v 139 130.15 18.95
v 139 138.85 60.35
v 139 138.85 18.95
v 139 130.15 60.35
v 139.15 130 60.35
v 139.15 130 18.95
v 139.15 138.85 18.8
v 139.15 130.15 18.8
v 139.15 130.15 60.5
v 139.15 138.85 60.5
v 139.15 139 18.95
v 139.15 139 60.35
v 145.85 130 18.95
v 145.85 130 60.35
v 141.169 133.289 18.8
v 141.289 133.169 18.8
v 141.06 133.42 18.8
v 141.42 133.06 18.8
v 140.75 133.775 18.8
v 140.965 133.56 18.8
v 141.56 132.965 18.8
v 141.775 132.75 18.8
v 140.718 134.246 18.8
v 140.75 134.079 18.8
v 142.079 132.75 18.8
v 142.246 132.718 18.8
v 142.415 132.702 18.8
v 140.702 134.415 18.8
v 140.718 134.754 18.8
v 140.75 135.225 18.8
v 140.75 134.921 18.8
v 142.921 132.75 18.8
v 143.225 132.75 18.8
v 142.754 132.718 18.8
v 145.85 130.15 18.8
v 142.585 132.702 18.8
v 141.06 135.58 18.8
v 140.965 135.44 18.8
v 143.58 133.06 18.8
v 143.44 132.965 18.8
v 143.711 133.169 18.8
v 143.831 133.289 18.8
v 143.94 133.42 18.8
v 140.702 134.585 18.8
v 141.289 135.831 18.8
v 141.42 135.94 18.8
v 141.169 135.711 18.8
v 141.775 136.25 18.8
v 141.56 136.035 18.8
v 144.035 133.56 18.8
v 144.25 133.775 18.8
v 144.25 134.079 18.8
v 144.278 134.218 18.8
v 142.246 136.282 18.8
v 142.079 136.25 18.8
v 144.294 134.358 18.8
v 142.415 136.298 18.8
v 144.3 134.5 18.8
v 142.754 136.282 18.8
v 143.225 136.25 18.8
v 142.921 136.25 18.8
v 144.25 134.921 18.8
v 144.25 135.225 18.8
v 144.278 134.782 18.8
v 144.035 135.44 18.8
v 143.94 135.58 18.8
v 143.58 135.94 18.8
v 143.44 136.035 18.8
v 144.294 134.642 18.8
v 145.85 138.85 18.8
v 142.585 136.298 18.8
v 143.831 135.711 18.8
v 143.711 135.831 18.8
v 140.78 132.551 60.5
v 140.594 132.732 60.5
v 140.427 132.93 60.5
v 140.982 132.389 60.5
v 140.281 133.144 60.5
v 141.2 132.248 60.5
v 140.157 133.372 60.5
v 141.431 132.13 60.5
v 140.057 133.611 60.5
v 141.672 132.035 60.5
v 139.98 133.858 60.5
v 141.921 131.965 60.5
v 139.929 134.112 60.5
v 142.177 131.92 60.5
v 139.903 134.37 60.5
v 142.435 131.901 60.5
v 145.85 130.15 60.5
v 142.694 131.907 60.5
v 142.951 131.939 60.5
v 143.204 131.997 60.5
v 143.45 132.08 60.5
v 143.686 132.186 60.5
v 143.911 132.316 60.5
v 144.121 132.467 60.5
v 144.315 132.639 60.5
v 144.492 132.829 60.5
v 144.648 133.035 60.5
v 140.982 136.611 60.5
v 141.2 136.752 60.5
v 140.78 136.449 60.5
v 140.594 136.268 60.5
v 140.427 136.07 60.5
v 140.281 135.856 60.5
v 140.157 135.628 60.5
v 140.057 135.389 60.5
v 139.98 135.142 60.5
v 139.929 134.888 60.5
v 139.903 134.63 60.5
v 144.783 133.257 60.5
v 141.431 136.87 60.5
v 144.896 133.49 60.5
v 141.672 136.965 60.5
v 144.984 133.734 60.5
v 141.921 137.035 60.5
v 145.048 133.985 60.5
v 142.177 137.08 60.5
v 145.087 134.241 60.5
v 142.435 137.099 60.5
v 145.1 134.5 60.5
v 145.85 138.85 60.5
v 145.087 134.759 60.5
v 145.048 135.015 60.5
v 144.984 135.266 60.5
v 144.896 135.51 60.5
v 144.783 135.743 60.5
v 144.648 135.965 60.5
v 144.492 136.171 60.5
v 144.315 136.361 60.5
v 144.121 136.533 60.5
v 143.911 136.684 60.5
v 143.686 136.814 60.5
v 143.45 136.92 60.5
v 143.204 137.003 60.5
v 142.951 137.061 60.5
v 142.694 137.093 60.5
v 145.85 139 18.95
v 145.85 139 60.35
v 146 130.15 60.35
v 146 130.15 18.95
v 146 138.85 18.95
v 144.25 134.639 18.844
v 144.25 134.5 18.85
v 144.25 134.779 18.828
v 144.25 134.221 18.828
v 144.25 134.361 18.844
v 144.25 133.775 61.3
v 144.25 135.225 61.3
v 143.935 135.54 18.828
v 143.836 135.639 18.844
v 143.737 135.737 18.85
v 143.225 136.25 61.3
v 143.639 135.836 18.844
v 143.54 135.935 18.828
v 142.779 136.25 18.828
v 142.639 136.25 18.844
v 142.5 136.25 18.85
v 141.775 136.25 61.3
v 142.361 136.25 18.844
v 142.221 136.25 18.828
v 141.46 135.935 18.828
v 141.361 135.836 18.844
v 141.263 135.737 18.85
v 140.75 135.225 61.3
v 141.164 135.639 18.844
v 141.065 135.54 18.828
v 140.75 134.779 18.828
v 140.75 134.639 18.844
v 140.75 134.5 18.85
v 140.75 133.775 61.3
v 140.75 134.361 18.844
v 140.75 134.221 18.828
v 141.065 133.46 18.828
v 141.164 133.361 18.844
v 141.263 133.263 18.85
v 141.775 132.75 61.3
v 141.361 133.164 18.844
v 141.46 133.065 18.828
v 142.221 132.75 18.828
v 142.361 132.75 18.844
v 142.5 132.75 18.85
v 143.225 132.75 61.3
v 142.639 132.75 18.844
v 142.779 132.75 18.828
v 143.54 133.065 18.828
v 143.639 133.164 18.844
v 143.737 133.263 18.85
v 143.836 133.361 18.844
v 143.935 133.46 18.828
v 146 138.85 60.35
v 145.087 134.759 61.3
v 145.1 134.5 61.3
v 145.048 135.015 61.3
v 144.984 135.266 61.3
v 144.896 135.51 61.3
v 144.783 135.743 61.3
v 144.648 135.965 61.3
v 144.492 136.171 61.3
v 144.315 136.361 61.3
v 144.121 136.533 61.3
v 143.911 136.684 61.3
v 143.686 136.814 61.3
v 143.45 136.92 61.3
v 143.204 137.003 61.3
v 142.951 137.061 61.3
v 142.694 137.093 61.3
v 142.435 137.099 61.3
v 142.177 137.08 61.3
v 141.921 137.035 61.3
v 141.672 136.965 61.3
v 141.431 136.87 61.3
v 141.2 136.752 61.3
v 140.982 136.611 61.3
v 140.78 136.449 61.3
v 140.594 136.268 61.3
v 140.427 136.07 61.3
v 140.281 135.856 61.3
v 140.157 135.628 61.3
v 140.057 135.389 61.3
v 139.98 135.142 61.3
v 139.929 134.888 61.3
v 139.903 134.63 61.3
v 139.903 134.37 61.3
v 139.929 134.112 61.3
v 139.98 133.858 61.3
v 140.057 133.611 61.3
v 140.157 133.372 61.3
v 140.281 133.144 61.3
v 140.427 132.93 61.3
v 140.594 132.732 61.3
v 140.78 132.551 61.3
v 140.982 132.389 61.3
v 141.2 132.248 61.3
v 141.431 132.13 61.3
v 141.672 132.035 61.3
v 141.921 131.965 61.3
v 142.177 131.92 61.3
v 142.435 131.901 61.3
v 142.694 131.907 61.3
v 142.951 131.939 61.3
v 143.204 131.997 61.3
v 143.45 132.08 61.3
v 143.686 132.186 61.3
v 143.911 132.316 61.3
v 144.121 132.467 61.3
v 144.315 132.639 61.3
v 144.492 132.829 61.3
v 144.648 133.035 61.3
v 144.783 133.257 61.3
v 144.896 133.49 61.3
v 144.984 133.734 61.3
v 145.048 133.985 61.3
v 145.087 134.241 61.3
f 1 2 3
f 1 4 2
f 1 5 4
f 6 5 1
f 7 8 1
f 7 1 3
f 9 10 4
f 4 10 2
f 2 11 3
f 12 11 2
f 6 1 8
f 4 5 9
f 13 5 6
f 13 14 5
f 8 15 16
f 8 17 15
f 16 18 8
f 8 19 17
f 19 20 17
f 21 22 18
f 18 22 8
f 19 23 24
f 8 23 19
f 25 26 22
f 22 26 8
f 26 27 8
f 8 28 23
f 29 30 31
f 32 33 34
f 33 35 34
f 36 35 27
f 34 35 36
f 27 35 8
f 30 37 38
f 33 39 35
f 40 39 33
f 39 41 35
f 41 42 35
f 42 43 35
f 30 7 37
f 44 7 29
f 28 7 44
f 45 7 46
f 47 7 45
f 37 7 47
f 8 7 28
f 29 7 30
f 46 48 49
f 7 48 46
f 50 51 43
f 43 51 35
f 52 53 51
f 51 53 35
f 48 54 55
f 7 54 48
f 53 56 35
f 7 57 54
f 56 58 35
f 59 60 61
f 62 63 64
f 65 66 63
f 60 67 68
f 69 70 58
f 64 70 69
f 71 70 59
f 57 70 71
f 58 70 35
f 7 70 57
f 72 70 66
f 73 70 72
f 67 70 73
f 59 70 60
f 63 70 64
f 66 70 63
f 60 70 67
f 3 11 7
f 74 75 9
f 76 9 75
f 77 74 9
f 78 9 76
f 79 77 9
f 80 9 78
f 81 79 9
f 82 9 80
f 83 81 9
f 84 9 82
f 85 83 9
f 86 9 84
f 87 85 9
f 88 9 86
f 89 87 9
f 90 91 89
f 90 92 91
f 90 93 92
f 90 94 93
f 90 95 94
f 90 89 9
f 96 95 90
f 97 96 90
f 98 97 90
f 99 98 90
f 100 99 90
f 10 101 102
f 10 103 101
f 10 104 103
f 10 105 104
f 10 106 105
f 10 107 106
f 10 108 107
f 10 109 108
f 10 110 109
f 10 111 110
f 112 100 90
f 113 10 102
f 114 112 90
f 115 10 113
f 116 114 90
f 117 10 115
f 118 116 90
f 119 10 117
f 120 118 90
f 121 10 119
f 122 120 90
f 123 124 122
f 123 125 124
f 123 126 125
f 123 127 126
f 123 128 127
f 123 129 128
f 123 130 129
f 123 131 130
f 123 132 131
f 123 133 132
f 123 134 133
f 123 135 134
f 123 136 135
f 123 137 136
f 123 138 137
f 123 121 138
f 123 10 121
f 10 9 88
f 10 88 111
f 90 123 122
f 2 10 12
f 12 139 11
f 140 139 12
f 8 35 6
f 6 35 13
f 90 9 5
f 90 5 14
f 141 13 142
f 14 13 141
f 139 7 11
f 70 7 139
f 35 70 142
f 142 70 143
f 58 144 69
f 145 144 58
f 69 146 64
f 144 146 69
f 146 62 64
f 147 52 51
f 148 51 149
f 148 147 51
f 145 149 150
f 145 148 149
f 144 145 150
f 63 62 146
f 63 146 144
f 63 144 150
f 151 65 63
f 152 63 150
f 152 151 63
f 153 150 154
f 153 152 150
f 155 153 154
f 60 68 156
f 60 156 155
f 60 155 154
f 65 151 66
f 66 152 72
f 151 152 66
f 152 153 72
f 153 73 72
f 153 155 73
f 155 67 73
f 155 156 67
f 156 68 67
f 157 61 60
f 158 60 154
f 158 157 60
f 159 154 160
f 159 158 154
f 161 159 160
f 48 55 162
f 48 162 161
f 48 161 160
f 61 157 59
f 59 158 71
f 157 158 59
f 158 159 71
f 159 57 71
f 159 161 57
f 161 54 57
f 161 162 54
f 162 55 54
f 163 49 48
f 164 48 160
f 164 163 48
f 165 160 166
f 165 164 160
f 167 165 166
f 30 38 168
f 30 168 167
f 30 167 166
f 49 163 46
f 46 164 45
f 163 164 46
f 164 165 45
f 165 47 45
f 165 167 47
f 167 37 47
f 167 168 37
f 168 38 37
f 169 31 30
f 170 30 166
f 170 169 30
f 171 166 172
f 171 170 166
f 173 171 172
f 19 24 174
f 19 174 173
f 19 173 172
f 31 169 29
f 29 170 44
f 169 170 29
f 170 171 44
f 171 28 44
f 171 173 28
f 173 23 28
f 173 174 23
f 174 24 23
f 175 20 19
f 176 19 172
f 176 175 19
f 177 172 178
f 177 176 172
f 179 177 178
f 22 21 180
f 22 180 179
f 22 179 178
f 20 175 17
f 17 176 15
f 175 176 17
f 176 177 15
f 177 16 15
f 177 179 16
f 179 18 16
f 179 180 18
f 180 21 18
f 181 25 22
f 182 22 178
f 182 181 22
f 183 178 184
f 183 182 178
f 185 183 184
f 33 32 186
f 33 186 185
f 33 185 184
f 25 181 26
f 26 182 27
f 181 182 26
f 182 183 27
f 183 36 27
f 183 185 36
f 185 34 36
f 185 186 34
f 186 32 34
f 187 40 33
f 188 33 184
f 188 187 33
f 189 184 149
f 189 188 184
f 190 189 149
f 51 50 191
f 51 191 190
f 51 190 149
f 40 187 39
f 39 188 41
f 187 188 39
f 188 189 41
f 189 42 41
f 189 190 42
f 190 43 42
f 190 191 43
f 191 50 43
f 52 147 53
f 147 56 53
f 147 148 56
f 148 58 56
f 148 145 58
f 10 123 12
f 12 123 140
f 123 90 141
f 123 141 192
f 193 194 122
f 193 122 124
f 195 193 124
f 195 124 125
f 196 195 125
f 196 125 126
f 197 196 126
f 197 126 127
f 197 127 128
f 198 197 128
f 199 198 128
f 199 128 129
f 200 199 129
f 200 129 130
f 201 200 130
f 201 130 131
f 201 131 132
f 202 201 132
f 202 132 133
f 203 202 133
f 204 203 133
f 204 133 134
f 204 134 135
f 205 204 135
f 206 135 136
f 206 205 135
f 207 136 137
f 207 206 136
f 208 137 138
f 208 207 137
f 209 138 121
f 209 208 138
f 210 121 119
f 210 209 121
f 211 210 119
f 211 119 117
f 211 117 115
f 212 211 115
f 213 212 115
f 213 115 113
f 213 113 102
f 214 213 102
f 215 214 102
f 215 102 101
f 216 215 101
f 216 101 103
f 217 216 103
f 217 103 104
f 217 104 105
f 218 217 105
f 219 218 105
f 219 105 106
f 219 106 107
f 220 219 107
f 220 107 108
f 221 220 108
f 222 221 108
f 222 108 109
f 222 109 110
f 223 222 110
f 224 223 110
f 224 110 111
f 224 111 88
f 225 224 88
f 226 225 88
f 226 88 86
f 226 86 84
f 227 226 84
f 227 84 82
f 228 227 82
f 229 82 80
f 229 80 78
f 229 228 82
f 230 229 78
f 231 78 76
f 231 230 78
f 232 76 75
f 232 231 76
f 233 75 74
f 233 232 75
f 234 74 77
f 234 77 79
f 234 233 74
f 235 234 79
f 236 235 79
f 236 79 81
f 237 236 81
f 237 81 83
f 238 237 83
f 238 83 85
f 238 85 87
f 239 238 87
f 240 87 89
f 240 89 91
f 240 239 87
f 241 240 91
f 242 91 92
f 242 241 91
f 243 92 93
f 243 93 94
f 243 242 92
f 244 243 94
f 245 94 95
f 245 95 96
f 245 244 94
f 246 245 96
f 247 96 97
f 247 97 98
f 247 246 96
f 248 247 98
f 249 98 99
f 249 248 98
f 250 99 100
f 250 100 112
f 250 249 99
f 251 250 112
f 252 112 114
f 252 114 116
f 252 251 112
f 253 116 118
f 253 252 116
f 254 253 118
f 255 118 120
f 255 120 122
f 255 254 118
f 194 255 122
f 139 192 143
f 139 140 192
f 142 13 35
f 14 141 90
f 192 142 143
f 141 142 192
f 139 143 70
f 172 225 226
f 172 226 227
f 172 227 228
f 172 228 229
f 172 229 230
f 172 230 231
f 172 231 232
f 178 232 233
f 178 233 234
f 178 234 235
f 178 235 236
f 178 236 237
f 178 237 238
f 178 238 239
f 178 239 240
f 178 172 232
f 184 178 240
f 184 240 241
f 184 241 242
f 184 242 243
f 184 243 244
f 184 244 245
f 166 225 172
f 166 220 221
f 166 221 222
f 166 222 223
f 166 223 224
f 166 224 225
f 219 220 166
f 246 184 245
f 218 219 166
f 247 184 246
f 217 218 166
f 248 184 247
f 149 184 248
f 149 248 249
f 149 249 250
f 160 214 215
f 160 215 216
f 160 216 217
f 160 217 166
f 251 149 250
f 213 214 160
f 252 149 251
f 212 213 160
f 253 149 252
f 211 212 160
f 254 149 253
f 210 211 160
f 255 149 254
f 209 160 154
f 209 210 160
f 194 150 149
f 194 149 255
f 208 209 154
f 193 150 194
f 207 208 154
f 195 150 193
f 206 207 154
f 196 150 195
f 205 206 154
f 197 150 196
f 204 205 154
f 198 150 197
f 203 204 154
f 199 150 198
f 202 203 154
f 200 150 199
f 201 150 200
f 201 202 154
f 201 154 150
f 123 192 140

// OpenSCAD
// Generated by the canonical parent Python sources and validated exchange pipeline.
polyhedron(points=[[139.0, 130.14999389648438, 18.950000762939453], [139.0, 138.85000610351562, 60.349998474121094], [139.0, 138.85000610351562, 18.950000762939453], [139.0, 130.14999389648438, 60.349998474121094], [139.14999389648438, 130.0, 60.349998474121094], [139.14999389648438, 130.0, 18.950000762939453], [139.14999389648438, 138.85000610351562, 18.799999237060547], [139.14999389648438, 130.14999389648438, 18.799999237060547], [139.14999389648438, 130.14999389648438, 60.5], [139.14999389648438, 138.85000610351562, 60.5], [139.14999389648438, 139.0, 18.950000762939453], [139.14999389648438, 139.0, 60.349998474121094], [145.85000610351562, 130.0, 18.950000762939453], [145.85000610351562, 130.0, 60.349998474121094], [141.16851806640625, 133.2887420654297, 18.799999237060547], [141.2887420654297, 133.16851806640625, 18.799999237060547], [141.06016540527344, 133.41978454589844, 18.799999237060547], [141.41978454589844, 133.06016540527344, 18.799999237060547], [140.75, 133.77513122558594, 18.799999237060547], [140.96466064453125, 133.5604705810547, 18.799999237060547], [141.5604705810547, 132.96466064453125, 18.799999237060547], [141.77513122558594, 132.75, 18.799999237060547], [140.71804809570312, 134.24569702148438, 18.799999237060547], [140.75, 134.0786895751953, 18.799999237060547], [142.0786895751953, 132.75, 18.799999237060547], [142.24569702148438, 132.71804809570312, 18.799999237060547], [142.41497802734375, 132.70201110839844, 18.799999237060547], [140.70201110839844, 134.41497802734375, 18.799999237060547], [140.71804809570312, 134.75430297851562, 18.799999237060547], [140.75, 135.22486877441406, 18.799999237060547], [140.75, 134.9213104248047, 18.799999237060547], [142.9213104248047, 132.75, 18.799999237060547], [143.22486877441406, 132.75, 18.799999237060547], [142.75430297851562, 132.71804809570312, 18.799999237060547], [145.85000610351562, 130.14999389648438, 18.799999237060547], [142.58502197265625, 132.70201110839844, 18.799999237060547], [141.06016540527344, 135.58021545410156, 18.799999237060547], [140.96466064453125, 135.4395294189453, 18.799999237060547], [143.58021545410156, 133.06016540527344, 18.799999237060547], [143.4395294189453, 132.96466064453125, 18.799999237060547], [143.7112579345703, 133.16851806640625, 18.799999237060547], [143.83148193359375, 133.2887420654297, 18.799999237060547], [143.93983459472656, 133.41978454589844, 18.799999237060547], [140.70201110839844, 134.58502197265625, 18.799999237060547], [141.2887420654297, 135.83148193359375, 18.799999237060547], [141.41978454589844, 135.93983459472656, 18.799999237060547], [141.16851806640625, 135.7112579345703, 18.799999237060547], [141.77513122558594, 136.25, 18.799999237060547], [141.5604705810547, 136.03533935546875, 18.799999237060547], [144.03533935546875, 133.5604705810547, 18.799999237060547], [144.25, 133.77513122558594, 18.799999237060547], [144.25, 134.0786895751953, 18.799999237060547], [144.27772521972656, 134.21766662597656, 18.799999237060547], [142.24569702148438, 136.28195190429688, 18.799999237060547], [142.0786895751953, 136.25, 18.799999237060547], [144.29441833496094, 134.3583984375, 18.799999237060547], [142.41497802734375, 136.29798889160156, 18.799999237060547], [144.3000030517578, 134.5, 18.799999237060547], [142.75430297851562, 136.28195190429688, 18.799999237060547], [143.22486877441406, 136.25, 18.799999237060547], [142.9213104248047, 136.25, 18.799999237060547], [144.25, 134.9213104248047, 18.799999237060547], [144.25, 135.22486877441406, 18.799999237060547], [144.27772521972656, 134.78233337402344, 18.799999237060547], [144.03533935546875, 135.4395294189453, 18.799999237060547], [143.93983459472656, 135.58021545410156, 18.799999237060547], [143.58021545410156, 135.93983459472656, 18.799999237060547], [143.4395294189453, 136.03533935546875, 18.799999237060547], [144.29441833496094, 134.6416015625, 18.799999237060547], [145.85000610351562, 138.85000610351562, 18.799999237060547], [142.58502197265625, 136.29798889160156, 18.799999237060547], [143.83148193359375, 135.7112579345703, 18.799999237060547], [143.7112579345703, 135.83148193359375, 18.799999237060547], [140.7796173095703, 132.55056762695312, 60.5], [140.5940704345703, 132.73155212402344, 60.5], [140.42745971679688, 132.93011474609375, 60.5], [140.98226928710938, 132.3889617919922, 60.5], [140.2814483642578, 133.14427185058594, 60.5], [141.1999969482422, 132.2483367919922, 60.5], [140.15748596191406, 133.3719024658203, 60.5], [141.43064880371094, 132.1300811767578, 60.5], [140.05679321289062, 133.61074829101562, 60.5], [141.67193603515625, 132.03538513183594, 60.5], [139.9803924560547, 133.85842895507812, 60.5], [141.92144775390625, 131.96519470214844, 60.5], [139.92904663085938, 134.11248779296875, 60.5], [142.1767120361328, 131.92018127441406, 60.5], [139.90322875976562, 134.3704071044922, 60.5], [142.4351806640625, 131.9008026123047, 60.5], [145.85000610351562, 130.14999389648438, 60.5], [142.69430541992188, 131.9072723388672, 60.5], [142.9514923095703, 131.9394989013672, 60.5], [143.2041778564453, 131.99717712402344, 60.5], [143.44989013671875, 132.07972717285156, 60.5], [143.68614196777344, 132.18634033203125, 60.5], [143.91061401367188, 132.31593322753906, 60.5], [144.12107849121094, 132.4672393798828, 60.5], [144.31541442871094, 132.6387481689453, 60.5], [144.49171447753906, 132.82875061035156, 60.5], [144.64822387695312, 133.03536987304688, 60.5], [140.98226928710938, 136.6110382080078, 60.5], [141.1999969482422, 136.7516632080078, 60.5], [140.7796173095703, 136.44943237304688, 60.5], [140.5940704345703, 136.26844787597656, 60.5], [140.42745971679688, 136.06988525390625, 60.5], [140.2814483642578, 135.85572814941406, 60.5], [140.15748596191406, 135.6280975341797, 60.5], [140.05679321289062, 135.38925170898438, 60.5], [139.9803924560547, 135.14157104492188, 60.5], [139.92904663085938, 134.88751220703125, 60.5], [139.90322875976562, 134.6295928955078, 60.5], [144.7833709716797, 133.2565460205078, 60.5], [141.43064880371094, 136.8699188232422, 60.5], [144.89584350585938, 133.4900665283203, 60.5], [141.67193603515625, 136.96461486816406, 60.5], [144.98448181152344, 133.733642578125, 60.5], [141.92144775390625, 137.03480529785156, 60.5], [145.04844665527344, 133.9848175048828, 60.5], [142.1767120361328, 137.07981872558594, 60.5], [145.0870819091797, 134.24111938476562, 60.5], [142.4351806640625, 137.0991973876953, 60.5], [145.10000610351562, 134.5, 60.5], [145.85000610351562, 138.85000610351562, 60.5], [145.0870819091797, 134.75888061523438, 60.5], [145.04844665527344, 135.0151824951172, 60.5], [144.98448181152344, 135.266357421875, 60.5], [144.89584350585938, 135.5099334716797, 60.5], [144.7833709716797, 135.7434539794922, 60.5], [144.64822387695312, 135.96463012695312, 60.5], [144.49171447753906, 136.17124938964844, 60.5], [144.31541442871094, 136.3612518310547, 60.5], [144.12107849121094, 136.5327606201172, 60.5], [143.91061401367188, 136.68406677246094, 60.5], [143.68614196777344, 136.81365966796875, 60.5], [143.44989013671875, 136.92027282714844, 60.5], [143.2041778564453, 137.00282287597656, 60.5], [142.9514923095703, 137.0605010986328, 60.5], [142.69430541992188, 137.0927276611328, 60.5], [145.85000610351562, 139.0, 18.950000762939453], [145.85000610351562, 139.0, 60.349998474121094], [146.0, 130.14999389648438, 60.349998474121094], [146.0, 130.14999389648438, 18.950000762939453], [146.0, 138.85000610351562, 18.950000762939453], [144.25, 134.63926696777344, 18.844467163085938], [144.25, 134.5, 18.850000381469727], [144.25, 134.77940368652344, 18.827836990356445], [144.25, 134.22059631347656, 18.827836990356445], [144.25, 134.36073303222656, 18.844467163085938], [144.25, 133.77513122558594, 61.29999923706055], [144.25, 135.22486877441406, 61.29999923706055], [143.93499755859375, 135.5398712158203, 18.827836990356445], [143.83590698242188, 135.6389617919922, 18.844467163085938], [143.73744201660156, 135.73744201660156, 18.850000381469727], [143.22486877441406, 136.25, 61.29999923706055], [143.6389617919922, 135.83590698242188, 18.844467163085938], [143.5398712158203, 135.93499755859375, 18.827836990356445], [142.77940368652344, 136.25, 18.827836990356445], [142.63926696777344, 136.25, 18.844467163085938], [142.5, 136.25, 18.850000381469727], [141.77513122558594, 136.25, 61.29999923706055], [142.36073303222656, 136.25, 18.844467163085938], [142.22059631347656, 136.25, 18.827836990356445], [141.4601287841797, 135.93499755859375, 18.827836990356445], [141.3610382080078, 135.83590698242188, 18.844467163085938], [141.26255798339844, 135.73744201660156, 18.850000381469727], [140.75, 135.22486877441406, 61.29999923706055], [141.16409301757812, 135.6389617919922, 18.844467163085938], [141.06500244140625, 135.5398712158203, 18.827836990356445], [140.75, 134.77940368652344, 18.827836990356445], [140.75, 134.63926696777344, 18.844467163085938], [140.75, 134.5, 18.850000381469727], [140.75, 133.77513122558594, 61.29999923706055], [140.75, 134.36073303222656, 18.844467163085938], [140.75, 134.22059631347656, 18.827836990356445], [141.06500244140625, 133.4601287841797, 18.827836990356445], [141.16409301757812, 133.3610382080078, 18.844467163085938], [141.26255798339844, 133.26255798339844, 18.850000381469727], [141.77513122558594, 132.75, 61.29999923706055], [141.3610382080078, 133.16409301757812, 18.844467163085938], [141.4601287841797, 133.06500244140625, 18.827836990356445], [142.22059631347656, 132.75, 18.827836990356445], [142.36073303222656, 132.75, 18.844467163085938], [142.5, 132.75, 18.850000381469727], [143.22486877441406, 132.75, 61.29999923706055], [142.63926696777344, 132.75, 18.844467163085938], [142.77940368652344, 132.75, 18.827836990356445], [143.5398712158203, 133.06500244140625, 18.827836990356445], [143.6389617919922, 133.16409301757812, 18.844467163085938], [143.73744201660156, 133.26255798339844, 18.850000381469727], [143.83590698242188, 133.3610382080078, 18.844467163085938], [143.93499755859375, 133.4601287841797, 18.827836990356445], [146.0, 138.85000610351562, 60.349998474121094], [145.0870819091797, 134.75888061523438, 61.29999923706055], [145.10000610351562, 134.5, 61.29999923706055], [145.04844665527344, 135.0151824951172, 61.29999923706055], [144.98448181152344, 135.266357421875, 61.29999923706055], [144.89584350585938, 135.5099334716797, 61.29999923706055], [144.7833709716797, 135.7434539794922, 61.29999923706055], [144.64822387695312, 135.96463012695312, 61.29999923706055], [144.49171447753906, 136.17124938964844, 61.29999923706055], [144.31541442871094, 136.3612518310547, 61.29999923706055], [144.12107849121094, 136.5327606201172, 61.29999923706055], [143.91061401367188, 136.68406677246094, 61.29999923706055], [143.68614196777344, 136.81365966796875, 61.29999923706055], [143.44989013671875, 136.92027282714844, 61.29999923706055], [143.2041778564453, 137.00282287597656, 61.29999923706055], [142.9514923095703, 137.0605010986328, 61.29999923706055], [142.69430541992188, 137.0927276611328, 61.29999923706055], [142.4351806640625, 137.0991973876953, 61.29999923706055], [142.1767120361328, 137.07981872558594, 61.29999923706055], [141.92144775390625, 137.03480529785156, 61.29999923706055], [141.67193603515625, 136.96461486816406, 61.29999923706055], [141.43064880371094, 136.8699188232422, 61.29999923706055], [141.1999969482422, 136.7516632080078, 61.29999923706055], [140.98226928710938, 136.6110382080078, 61.29999923706055], [140.7796173095703, 136.44943237304688, 61.29999923706055], [140.5940704345703, 136.26844787597656, 61.29999923706055], [140.42745971679688, 136.06988525390625, 61.29999923706055], [140.2814483642578, 135.85572814941406, 61.29999923706055], [140.15748596191406, 135.6280975341797, 61.29999923706055], [140.05679321289062, 135.38925170898438, 61.29999923706055], [139.9803924560547, 135.14157104492188, 61.29999923706055], [139.92904663085938, 134.88751220703125, 61.29999923706055], [139.90322875976562, 134.6295928955078, 61.29999923706055], [139.90322875976562, 134.3704071044922, 61.29999923706055], [139.92904663085938, 134.11248779296875, 61.29999923706055], [139.9803924560547, 133.85842895507812, 61.29999923706055], [140.05679321289062, 133.61074829101562, 61.29999923706055], [140.15748596191406, 133.3719024658203, 61.29999923706055], [140.2814483642578, 133.14427185058594, 61.29999923706055], [140.42745971679688, 132.93011474609375, 61.29999923706055], [140.5940704345703, 132.73155212402344, 61.29999923706055], [140.7796173095703, 132.55056762695312, 61.29999923706055], [140.98226928710938, 132.3889617919922, 61.29999923706055], [141.1999969482422, 132.2483367919922, 61.29999923706055], [141.43064880371094, 132.1300811767578, 61.29999923706055], [141.67193603515625, 132.03538513183594, 61.29999923706055], [141.92144775390625, 131.96519470214844, 61.29999923706055], [142.1767120361328, 131.92018127441406, 61.29999923706055], [142.4351806640625, 131.9008026123047, 61.29999923706055], [142.69430541992188, 131.9072723388672, 61.29999923706055], [142.9514923095703, 131.9394989013672, 61.29999923706055], [143.2041778564453, 131.99717712402344, 61.29999923706055], [143.44989013671875, 132.07972717285156, 61.29999923706055], [143.68614196777344, 132.18634033203125, 61.29999923706055], [143.91061401367188, 132.31593322753906, 61.29999923706055], [144.12107849121094, 132.4672393798828, 61.29999923706055], [144.31541442871094, 132.6387481689453, 61.29999923706055], [144.49171447753906, 132.82875061035156, 61.29999923706055], [144.64822387695312, 133.03536987304688, 61.29999923706055], [144.7833709716797, 133.2565460205078, 61.29999923706055], [144.89584350585938, 133.4900665283203, 61.29999923706055], [144.98448181152344, 133.733642578125, 61.29999923706055], [145.04844665527344, 133.9848175048828, 61.29999923706055], [145.0870819091797, 134.24111938476562, 61.29999923706055]],faces=[[2, 1, 0], [1, 3, 0], [3, 4, 0], [0, 4, 5], [0, 7, 6], [2, 0, 6], [3, 9, 8], [1, 9, 3], [2, 10, 1], [1, 10, 11], [7, 0, 5], [8, 4, 3], [5, 4, 12], [4, 13, 12], [15, 14, 7], [14, 16, 7], [7, 17, 15], [16, 18, 7], [16, 19, 18], [17, 21, 20], [7, 21, 17], [23, 22, 18], [18, 22, 7], [21, 25, 24], [7, 25, 21], [7, 26, 25], [22, 27, 7], [30, 29, 28], [33, 32, 31], [33, 34, 32], [26, 34, 35], [35, 34, 33], [7, 34, 26], [37, 36, 29], [34, 38, 32], [32, 38, 39], [34, 40, 38], [34, 41, 40], [34, 42, 41], [36, 6, 29], [28, 6, 43], [43, 6, 27], [45, 6, 44], [44, 6, 46], [46, 6, 36], [27, 6, 7], [29, 6, 28], [48, 47, 45], [45, 47, 6], [42, 50, 49], [34, 50, 42], [50, 52, 51], [34, 52, 50], [54, 53, 47], [47, 53, 6], [34, 55, 52], [53, 56, 6], [34, 57, 55], [60, 59, 58], [63, 62, 61], [62, 65, 64], [67, 66, 59], [57, 69, 68], [68, 69, 63], [58, 69, 70], [70, 69, 56], [34, 69, 57], [56, 69, 6], [65, 69, 71], [71, 69, 72], [72, 69, 66], [59, 69, 58], [63, 69, 62], [62, 69, 65], [66, 69, 59], [6, 10, 2], [8, 74, 73], [74, 8, 75], [8, 73, 76], [75, 8, 77], [8, 76, 78], [77, 8, 79], [8, 78, 80], [79, 8, 81], [8, 80, 82], [81, 8, 83], [8, 82, 84], [83, 8, 85], [8, 84, 86], [85, 8, 87], [8, 86, 88], [88, 90, 89], [90, 91, 89], [91, 92, 89], [92, 93, 89], [93, 94, 89], [8, 88, 89], [89, 94, 95], [89, 95, 96], [89, 96, 97], [89, 97, 98], [89, 98, 99], [101, 100, 9], [100, 102, 9], [102, 103, 9], [103, 104, 9], [104, 105, 9], [105, 106, 9], [106, 107, 9], [107, 108, 9], [108, 109, 9], [109, 110, 9], [89, 99, 111], [101, 9, 112], [89, 111, 113], [112, 9, 114], [89, 113, 115], [114, 9, 116], [89, 115, 117], [116, 9, 118], [89, 117, 119], [118, 9, 120], [89, 119, 121], [121, 123, 122], [123, 124, 122], [124, 125, 122], [125, 126, 122], [126, 127, 122], [127, 128, 122], [128, 129, 122], [129, 130, 122], [130, 131, 122], [131, 132, 122], [132, 133, 122], [133, 134, 122], [134, 135, 122], [135, 136, 122], [136, 137, 122], [137, 120, 122], [120, 9, 122], [87, 8, 9], [110, 87, 9], [121, 122, 89], [11, 9, 1], [10, 138, 11], [11, 138, 139], [5, 34, 7], [12, 34, 5], [4, 8, 89], [13, 4, 89], [141, 12, 140], [140, 12, 13], [10, 6, 138], [138, 6, 69], [141, 69, 34], [142, 69, 141], [68, 143, 57], [57, 143, 144], [63, 145, 68], [68, 145, 143], [63, 61, 145], [50, 51, 146], [148, 50, 147], [50, 146, 147], [149, 148, 144], [148, 147, 144], [149, 144, 143], [145, 61, 62], [143, 145, 62], [149, 143, 62], [62, 64, 150], [149, 62, 151], [62, 150, 151], [153, 149, 152], [149, 151, 152], [153, 152, 154], [155, 67, 59], [154, 155, 59], [153, 154, 59], [65, 150, 64], [71, 151, 65], [65, 151, 150], [71, 152, 151], [71, 72, 152], [72, 154, 152], [72, 66, 154], [66, 155, 154], [66, 67, 155], [59, 60, 156], [153, 59, 157], [59, 156, 157], [159, 153, 158], [153, 157, 158], [159, 158, 160], [161, 54, 47], [160, 161, 47], [159, 160, 47], [58, 156, 60], [70, 157, 58], [58, 157, 156], [70, 158, 157], [70, 56, 158], [56, 160, 158], [56, 53, 160], [53, 161, 160], [53, 54, 161], [47, 48, 162], [159, 47, 163], [47, 162, 163], [165, 159, 164], [159, 163, 164], [165, 164, 166], [167, 37, 29], [166, 167, 29], [165, 166, 29], [45, 162, 48], [44, 163, 45], [45, 163, 162], [44, 164, 163], [44, 46, 164], [46, 166, 164], [46, 36, 166], [36, 167, 166], [36, 37, 167], [29, 30, 168], [165, 29, 169], [29, 168, 169], [171, 165, 170], [165, 169, 170], [171, 170, 172], [173, 23, 18], [172, 173, 18], [171, 172, 18], [28, 168, 30], [43, 169, 28], [28, 169, 168], [43, 170, 169], [43, 27, 170], [27, 172, 170], [27, 22, 172], [22, 173, 172], [22, 23, 173], [18, 19, 174], [171, 18, 175], [18, 174, 175], [177, 171, 176], [171, 175, 176], [177, 176, 178], [179, 20, 21], [178, 179, 21], [177, 178, 21], [16, 174, 19], [14, 175, 16], [16, 175, 174], [14, 176, 175], [14, 15, 176], [15, 178, 176], [15, 17, 178], [17, 179, 178], [17, 20, 179], [21, 24, 180], [177, 21, 181], [21, 180, 181], [183, 177, 182], [177, 181, 182], [183, 182, 184], [185, 31, 32], [184, 185, 32], [183, 184, 32], [25, 180, 24], [26, 181, 25], [25, 181, 180], [26, 182, 181], [26, 35, 182], [35, 184, 182], [35, 33, 184], [33, 185, 184], [33, 31, 185], [32, 39, 186], [183, 32, 187], [32, 186, 187], [148, 183, 188], [183, 187, 188], [148, 188, 189], [190, 49, 50], [189, 190, 50], [148, 189, 50], [38, 186, 39], [40, 187, 38], [38, 187, 186], [40, 188, 187], [40, 41, 188], [41, 189, 188], [41, 42, 189], [42, 190, 189], [42, 49, 190], [52, 146, 51], [52, 55, 146], [55, 147, 146], [55, 57, 147], [57, 144, 147], [11, 122, 9], [139, 122, 11], [140, 89, 122], [191, 140, 122], [121, 193, 192], [123, 121, 192], [123, 192, 194], [124, 123, 194], [124, 194, 195], [125, 124, 195], [125, 195, 196], [126, 125, 196], [127, 126, 196], [127, 196, 197], [127, 197, 198], [128, 127, 198], [128, 198, 199], [129, 128, 199], [129, 199, 200], [130, 129, 200], [131, 130, 200], [131, 200, 201], [132, 131, 201], [132, 201, 202], [132, 202, 203], [133, 132, 203], [134, 133, 203], [134, 203, 204], [135, 134, 205], [134, 204, 205], [136, 135, 206], [135, 205, 206], [137, 136, 207], [136, 206, 207], [120, 137, 208], [137, 207, 208], [118, 120, 209], [120, 208, 209], [118, 209, 210], [116, 118, 210], [114, 116, 210], [114, 210, 211], [114, 211, 212], [112, 114, 212], [101, 112, 212], [101, 212, 213], [101, 213, 214], [100, 101, 214], [100, 214, 215], [102, 100, 215], [102, 215, 216], [103, 102, 216], [104, 103, 216], [104, 216, 217], [104, 217, 218], [105, 104, 218], [106, 105, 218], [106, 218, 219], [107, 106, 219], [107, 219, 220], [107, 220, 221], [108, 107, 221], [109, 108, 221], [109, 221, 222], [109, 222, 223], [110, 109, 223], [87, 110, 223], [87, 223, 224], [87, 224, 225], [85, 87, 225], [83, 85, 225], [83, 225, 226], [81, 83, 226], [81, 226, 227], [79, 81, 228], [77, 79, 228], [81, 227, 228], [77, 228, 229], [75, 77, 230], [77, 229, 230], [74, 75, 231], [75, 230, 231], [73, 74, 232], [74, 231, 232], [76, 73, 233], [78, 76, 233], [73, 232, 233], [78, 233, 234], [78, 234, 235], [80, 78, 235], [80, 235, 236], [82, 80, 236], [82, 236, 237], [84, 82, 237], [86, 84, 237], [86, 237, 238], [88, 86, 239], [90, 88, 239], [86, 238, 239], [90, 239, 240], [91, 90, 241], [90, 240, 241], [92, 91, 242], [93, 92, 242], [91, 241, 242], [93, 242, 243], [94, 93, 244], [95, 94, 244], [93, 243, 244], [95, 244, 245], [96, 95, 246], [97, 96, 246], [95, 245, 246], [97, 246, 247], [98, 97, 248], [97, 247, 248], [99, 98, 249], [111, 99, 249], [98, 248, 249], [111, 249, 250], [113, 111, 251], [115, 113, 251], [111, 250, 251], [117, 115, 252], [115, 251, 252], [117, 252, 253], [119, 117, 254], [121, 119, 254], [117, 253, 254], [121, 254, 193], [142, 191, 138], [191, 139, 138], [34, 12, 141], [89, 140, 13], [142, 141, 191], [191, 141, 140], [69, 142, 138], [225, 224, 171], [226, 225, 171], [227, 226, 171], [228, 227, 171], [229, 228, 171], [230, 229, 171], [231, 230, 171], [232, 231, 177], [233, 232, 177], [234, 233, 177], [235, 234, 177], [236, 235, 177], [237, 236, 177], [238, 237, 177], [239, 238, 177], [231, 171, 177], [239, 177, 183], [240, 239, 183], [241, 240, 183], [242, 241, 183], [243, 242, 183], [244, 243, 183], [171, 224, 165], [220, 219, 165], [221, 220, 165], [222, 221, 165], [223, 222, 165], [224, 223, 165], [165, 219, 218], [244, 183, 245], [165, 218, 217], [245, 183, 246], [165, 217, 216], [246, 183, 247], [247, 183, 148], [248, 247, 148], [249, 248, 148], [214, 213, 159], [215, 214, 159], [216, 215, 159], [165, 216, 159], [249, 148, 250], [159, 213, 212], [250, 148, 251], [159, 212, 211], [251, 148, 252], [159, 211, 210], [252, 148, 253], [159, 210, 209], [253, 148, 254], [153, 159, 208], [159, 209, 208], [148, 149, 193], [254, 148, 193], [153, 208, 207], [193, 149, 192], [153, 207, 206], [192, 149, 194], [153, 206, 205], [194, 149, 195], [153, 205, 204], [195, 149, 196], [153, 204, 203], [196, 149, 197], [153, 203, 202], [197, 149, 198], [153, 202, 201], [198, 149, 199], [199, 149, 200], [153, 201, 200], [149, 153, 200], [139, 191, 122]],convexity=10);
